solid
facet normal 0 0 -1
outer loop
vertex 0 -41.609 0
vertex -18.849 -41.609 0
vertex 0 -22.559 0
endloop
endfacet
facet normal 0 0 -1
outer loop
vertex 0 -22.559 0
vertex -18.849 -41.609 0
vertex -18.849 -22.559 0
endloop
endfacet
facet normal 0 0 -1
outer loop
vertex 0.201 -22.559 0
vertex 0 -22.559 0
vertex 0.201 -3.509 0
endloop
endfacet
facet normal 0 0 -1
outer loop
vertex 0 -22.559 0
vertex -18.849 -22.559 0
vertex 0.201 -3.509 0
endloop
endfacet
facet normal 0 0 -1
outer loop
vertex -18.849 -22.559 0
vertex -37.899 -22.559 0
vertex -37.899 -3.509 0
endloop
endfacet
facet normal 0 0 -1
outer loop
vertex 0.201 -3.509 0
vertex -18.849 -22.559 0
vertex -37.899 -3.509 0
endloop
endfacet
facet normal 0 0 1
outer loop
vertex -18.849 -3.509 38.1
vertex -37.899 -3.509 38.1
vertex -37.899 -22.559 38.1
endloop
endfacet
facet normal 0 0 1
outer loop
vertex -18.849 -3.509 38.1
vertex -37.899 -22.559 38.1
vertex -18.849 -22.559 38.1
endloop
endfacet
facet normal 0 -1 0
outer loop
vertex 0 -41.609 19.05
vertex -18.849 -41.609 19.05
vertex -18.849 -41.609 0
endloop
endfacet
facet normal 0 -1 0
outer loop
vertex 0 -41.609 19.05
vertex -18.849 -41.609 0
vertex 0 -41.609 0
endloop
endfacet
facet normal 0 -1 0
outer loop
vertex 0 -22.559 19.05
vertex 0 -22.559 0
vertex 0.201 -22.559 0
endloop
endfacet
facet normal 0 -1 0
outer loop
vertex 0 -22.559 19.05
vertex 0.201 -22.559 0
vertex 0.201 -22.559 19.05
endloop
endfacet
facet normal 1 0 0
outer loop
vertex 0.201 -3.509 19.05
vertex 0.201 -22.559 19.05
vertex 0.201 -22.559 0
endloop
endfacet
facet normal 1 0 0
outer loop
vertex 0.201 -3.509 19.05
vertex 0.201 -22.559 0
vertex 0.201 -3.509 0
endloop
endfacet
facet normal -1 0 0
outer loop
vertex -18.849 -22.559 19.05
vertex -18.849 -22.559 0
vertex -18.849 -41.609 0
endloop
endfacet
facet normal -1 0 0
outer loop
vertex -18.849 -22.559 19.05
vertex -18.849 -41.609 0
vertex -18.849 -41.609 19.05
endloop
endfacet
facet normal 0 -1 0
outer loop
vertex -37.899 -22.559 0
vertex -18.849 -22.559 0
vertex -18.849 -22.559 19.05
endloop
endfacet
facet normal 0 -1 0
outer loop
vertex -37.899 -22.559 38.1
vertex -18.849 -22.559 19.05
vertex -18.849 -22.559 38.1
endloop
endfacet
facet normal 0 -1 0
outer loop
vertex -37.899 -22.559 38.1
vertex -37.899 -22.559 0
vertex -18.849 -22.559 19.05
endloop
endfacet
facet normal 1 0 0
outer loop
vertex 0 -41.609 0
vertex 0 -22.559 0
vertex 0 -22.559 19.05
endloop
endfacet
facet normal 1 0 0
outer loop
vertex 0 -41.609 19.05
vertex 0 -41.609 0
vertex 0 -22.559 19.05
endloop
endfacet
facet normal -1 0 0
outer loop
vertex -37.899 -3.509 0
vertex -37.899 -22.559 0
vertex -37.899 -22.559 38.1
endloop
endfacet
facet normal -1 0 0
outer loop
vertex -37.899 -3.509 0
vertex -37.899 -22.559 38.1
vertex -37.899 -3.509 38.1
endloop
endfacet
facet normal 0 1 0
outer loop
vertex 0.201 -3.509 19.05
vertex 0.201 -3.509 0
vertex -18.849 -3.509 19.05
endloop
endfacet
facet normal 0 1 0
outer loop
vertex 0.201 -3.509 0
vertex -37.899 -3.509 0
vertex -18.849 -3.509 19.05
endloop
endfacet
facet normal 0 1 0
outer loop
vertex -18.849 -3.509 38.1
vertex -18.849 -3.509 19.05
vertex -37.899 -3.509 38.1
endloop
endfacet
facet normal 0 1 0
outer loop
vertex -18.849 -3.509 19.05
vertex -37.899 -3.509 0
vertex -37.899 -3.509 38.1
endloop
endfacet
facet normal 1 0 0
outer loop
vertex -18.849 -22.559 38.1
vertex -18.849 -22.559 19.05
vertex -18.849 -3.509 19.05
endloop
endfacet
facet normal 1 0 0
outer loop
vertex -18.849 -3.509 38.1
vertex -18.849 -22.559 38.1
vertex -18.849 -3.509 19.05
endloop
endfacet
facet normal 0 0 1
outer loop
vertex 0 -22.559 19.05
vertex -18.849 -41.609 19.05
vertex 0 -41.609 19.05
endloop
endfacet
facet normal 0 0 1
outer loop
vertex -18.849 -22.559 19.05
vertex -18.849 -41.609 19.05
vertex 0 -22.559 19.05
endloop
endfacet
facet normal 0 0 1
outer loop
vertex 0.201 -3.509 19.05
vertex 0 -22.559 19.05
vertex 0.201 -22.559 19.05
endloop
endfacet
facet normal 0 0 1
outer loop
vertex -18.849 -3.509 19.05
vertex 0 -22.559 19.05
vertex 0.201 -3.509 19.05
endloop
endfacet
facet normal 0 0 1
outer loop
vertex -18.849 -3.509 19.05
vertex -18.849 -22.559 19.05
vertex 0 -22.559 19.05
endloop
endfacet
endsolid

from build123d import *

# Parameters (mm, degrees)
F0_W     = 19.05
F0_H     = 19.05
F1_DEPTH = 38.1
F2_W     = 19.05
F2_H     = 19.05
F3_DEPTH = 19.05
F4_W     = 18.848901
F4_H     = 19.05
F5_DEPTH = 19.05


with BuildPart() as f1:
    # F0 (on Top) → F1 (new body)
    with BuildSketch(Plane.XY):
        with Locations((-28.373901, -13.033835)):
            Rectangle(F0_W, F0_H)
    extrude(amount=F1_DEPTH)

    # F2 (on face) → F3 (join)
    with BuildSketch(Plane.YZ.offset(-18.848901)):
        with Locations((-13.033835, 9.525)):
            Rectangle(F2_W, F2_H)
    extrude(amount=F3_DEPTH)

    # F4 (on face) → F5 (join)
    with BuildSketch(Plane.XZ.offset(22.558835)):
        with Locations((-9.42445, 9.525)):
            Rectangle(F4_W, F4_H)
    extrude(amount=F5_DEPTH)


solid = f1.part
